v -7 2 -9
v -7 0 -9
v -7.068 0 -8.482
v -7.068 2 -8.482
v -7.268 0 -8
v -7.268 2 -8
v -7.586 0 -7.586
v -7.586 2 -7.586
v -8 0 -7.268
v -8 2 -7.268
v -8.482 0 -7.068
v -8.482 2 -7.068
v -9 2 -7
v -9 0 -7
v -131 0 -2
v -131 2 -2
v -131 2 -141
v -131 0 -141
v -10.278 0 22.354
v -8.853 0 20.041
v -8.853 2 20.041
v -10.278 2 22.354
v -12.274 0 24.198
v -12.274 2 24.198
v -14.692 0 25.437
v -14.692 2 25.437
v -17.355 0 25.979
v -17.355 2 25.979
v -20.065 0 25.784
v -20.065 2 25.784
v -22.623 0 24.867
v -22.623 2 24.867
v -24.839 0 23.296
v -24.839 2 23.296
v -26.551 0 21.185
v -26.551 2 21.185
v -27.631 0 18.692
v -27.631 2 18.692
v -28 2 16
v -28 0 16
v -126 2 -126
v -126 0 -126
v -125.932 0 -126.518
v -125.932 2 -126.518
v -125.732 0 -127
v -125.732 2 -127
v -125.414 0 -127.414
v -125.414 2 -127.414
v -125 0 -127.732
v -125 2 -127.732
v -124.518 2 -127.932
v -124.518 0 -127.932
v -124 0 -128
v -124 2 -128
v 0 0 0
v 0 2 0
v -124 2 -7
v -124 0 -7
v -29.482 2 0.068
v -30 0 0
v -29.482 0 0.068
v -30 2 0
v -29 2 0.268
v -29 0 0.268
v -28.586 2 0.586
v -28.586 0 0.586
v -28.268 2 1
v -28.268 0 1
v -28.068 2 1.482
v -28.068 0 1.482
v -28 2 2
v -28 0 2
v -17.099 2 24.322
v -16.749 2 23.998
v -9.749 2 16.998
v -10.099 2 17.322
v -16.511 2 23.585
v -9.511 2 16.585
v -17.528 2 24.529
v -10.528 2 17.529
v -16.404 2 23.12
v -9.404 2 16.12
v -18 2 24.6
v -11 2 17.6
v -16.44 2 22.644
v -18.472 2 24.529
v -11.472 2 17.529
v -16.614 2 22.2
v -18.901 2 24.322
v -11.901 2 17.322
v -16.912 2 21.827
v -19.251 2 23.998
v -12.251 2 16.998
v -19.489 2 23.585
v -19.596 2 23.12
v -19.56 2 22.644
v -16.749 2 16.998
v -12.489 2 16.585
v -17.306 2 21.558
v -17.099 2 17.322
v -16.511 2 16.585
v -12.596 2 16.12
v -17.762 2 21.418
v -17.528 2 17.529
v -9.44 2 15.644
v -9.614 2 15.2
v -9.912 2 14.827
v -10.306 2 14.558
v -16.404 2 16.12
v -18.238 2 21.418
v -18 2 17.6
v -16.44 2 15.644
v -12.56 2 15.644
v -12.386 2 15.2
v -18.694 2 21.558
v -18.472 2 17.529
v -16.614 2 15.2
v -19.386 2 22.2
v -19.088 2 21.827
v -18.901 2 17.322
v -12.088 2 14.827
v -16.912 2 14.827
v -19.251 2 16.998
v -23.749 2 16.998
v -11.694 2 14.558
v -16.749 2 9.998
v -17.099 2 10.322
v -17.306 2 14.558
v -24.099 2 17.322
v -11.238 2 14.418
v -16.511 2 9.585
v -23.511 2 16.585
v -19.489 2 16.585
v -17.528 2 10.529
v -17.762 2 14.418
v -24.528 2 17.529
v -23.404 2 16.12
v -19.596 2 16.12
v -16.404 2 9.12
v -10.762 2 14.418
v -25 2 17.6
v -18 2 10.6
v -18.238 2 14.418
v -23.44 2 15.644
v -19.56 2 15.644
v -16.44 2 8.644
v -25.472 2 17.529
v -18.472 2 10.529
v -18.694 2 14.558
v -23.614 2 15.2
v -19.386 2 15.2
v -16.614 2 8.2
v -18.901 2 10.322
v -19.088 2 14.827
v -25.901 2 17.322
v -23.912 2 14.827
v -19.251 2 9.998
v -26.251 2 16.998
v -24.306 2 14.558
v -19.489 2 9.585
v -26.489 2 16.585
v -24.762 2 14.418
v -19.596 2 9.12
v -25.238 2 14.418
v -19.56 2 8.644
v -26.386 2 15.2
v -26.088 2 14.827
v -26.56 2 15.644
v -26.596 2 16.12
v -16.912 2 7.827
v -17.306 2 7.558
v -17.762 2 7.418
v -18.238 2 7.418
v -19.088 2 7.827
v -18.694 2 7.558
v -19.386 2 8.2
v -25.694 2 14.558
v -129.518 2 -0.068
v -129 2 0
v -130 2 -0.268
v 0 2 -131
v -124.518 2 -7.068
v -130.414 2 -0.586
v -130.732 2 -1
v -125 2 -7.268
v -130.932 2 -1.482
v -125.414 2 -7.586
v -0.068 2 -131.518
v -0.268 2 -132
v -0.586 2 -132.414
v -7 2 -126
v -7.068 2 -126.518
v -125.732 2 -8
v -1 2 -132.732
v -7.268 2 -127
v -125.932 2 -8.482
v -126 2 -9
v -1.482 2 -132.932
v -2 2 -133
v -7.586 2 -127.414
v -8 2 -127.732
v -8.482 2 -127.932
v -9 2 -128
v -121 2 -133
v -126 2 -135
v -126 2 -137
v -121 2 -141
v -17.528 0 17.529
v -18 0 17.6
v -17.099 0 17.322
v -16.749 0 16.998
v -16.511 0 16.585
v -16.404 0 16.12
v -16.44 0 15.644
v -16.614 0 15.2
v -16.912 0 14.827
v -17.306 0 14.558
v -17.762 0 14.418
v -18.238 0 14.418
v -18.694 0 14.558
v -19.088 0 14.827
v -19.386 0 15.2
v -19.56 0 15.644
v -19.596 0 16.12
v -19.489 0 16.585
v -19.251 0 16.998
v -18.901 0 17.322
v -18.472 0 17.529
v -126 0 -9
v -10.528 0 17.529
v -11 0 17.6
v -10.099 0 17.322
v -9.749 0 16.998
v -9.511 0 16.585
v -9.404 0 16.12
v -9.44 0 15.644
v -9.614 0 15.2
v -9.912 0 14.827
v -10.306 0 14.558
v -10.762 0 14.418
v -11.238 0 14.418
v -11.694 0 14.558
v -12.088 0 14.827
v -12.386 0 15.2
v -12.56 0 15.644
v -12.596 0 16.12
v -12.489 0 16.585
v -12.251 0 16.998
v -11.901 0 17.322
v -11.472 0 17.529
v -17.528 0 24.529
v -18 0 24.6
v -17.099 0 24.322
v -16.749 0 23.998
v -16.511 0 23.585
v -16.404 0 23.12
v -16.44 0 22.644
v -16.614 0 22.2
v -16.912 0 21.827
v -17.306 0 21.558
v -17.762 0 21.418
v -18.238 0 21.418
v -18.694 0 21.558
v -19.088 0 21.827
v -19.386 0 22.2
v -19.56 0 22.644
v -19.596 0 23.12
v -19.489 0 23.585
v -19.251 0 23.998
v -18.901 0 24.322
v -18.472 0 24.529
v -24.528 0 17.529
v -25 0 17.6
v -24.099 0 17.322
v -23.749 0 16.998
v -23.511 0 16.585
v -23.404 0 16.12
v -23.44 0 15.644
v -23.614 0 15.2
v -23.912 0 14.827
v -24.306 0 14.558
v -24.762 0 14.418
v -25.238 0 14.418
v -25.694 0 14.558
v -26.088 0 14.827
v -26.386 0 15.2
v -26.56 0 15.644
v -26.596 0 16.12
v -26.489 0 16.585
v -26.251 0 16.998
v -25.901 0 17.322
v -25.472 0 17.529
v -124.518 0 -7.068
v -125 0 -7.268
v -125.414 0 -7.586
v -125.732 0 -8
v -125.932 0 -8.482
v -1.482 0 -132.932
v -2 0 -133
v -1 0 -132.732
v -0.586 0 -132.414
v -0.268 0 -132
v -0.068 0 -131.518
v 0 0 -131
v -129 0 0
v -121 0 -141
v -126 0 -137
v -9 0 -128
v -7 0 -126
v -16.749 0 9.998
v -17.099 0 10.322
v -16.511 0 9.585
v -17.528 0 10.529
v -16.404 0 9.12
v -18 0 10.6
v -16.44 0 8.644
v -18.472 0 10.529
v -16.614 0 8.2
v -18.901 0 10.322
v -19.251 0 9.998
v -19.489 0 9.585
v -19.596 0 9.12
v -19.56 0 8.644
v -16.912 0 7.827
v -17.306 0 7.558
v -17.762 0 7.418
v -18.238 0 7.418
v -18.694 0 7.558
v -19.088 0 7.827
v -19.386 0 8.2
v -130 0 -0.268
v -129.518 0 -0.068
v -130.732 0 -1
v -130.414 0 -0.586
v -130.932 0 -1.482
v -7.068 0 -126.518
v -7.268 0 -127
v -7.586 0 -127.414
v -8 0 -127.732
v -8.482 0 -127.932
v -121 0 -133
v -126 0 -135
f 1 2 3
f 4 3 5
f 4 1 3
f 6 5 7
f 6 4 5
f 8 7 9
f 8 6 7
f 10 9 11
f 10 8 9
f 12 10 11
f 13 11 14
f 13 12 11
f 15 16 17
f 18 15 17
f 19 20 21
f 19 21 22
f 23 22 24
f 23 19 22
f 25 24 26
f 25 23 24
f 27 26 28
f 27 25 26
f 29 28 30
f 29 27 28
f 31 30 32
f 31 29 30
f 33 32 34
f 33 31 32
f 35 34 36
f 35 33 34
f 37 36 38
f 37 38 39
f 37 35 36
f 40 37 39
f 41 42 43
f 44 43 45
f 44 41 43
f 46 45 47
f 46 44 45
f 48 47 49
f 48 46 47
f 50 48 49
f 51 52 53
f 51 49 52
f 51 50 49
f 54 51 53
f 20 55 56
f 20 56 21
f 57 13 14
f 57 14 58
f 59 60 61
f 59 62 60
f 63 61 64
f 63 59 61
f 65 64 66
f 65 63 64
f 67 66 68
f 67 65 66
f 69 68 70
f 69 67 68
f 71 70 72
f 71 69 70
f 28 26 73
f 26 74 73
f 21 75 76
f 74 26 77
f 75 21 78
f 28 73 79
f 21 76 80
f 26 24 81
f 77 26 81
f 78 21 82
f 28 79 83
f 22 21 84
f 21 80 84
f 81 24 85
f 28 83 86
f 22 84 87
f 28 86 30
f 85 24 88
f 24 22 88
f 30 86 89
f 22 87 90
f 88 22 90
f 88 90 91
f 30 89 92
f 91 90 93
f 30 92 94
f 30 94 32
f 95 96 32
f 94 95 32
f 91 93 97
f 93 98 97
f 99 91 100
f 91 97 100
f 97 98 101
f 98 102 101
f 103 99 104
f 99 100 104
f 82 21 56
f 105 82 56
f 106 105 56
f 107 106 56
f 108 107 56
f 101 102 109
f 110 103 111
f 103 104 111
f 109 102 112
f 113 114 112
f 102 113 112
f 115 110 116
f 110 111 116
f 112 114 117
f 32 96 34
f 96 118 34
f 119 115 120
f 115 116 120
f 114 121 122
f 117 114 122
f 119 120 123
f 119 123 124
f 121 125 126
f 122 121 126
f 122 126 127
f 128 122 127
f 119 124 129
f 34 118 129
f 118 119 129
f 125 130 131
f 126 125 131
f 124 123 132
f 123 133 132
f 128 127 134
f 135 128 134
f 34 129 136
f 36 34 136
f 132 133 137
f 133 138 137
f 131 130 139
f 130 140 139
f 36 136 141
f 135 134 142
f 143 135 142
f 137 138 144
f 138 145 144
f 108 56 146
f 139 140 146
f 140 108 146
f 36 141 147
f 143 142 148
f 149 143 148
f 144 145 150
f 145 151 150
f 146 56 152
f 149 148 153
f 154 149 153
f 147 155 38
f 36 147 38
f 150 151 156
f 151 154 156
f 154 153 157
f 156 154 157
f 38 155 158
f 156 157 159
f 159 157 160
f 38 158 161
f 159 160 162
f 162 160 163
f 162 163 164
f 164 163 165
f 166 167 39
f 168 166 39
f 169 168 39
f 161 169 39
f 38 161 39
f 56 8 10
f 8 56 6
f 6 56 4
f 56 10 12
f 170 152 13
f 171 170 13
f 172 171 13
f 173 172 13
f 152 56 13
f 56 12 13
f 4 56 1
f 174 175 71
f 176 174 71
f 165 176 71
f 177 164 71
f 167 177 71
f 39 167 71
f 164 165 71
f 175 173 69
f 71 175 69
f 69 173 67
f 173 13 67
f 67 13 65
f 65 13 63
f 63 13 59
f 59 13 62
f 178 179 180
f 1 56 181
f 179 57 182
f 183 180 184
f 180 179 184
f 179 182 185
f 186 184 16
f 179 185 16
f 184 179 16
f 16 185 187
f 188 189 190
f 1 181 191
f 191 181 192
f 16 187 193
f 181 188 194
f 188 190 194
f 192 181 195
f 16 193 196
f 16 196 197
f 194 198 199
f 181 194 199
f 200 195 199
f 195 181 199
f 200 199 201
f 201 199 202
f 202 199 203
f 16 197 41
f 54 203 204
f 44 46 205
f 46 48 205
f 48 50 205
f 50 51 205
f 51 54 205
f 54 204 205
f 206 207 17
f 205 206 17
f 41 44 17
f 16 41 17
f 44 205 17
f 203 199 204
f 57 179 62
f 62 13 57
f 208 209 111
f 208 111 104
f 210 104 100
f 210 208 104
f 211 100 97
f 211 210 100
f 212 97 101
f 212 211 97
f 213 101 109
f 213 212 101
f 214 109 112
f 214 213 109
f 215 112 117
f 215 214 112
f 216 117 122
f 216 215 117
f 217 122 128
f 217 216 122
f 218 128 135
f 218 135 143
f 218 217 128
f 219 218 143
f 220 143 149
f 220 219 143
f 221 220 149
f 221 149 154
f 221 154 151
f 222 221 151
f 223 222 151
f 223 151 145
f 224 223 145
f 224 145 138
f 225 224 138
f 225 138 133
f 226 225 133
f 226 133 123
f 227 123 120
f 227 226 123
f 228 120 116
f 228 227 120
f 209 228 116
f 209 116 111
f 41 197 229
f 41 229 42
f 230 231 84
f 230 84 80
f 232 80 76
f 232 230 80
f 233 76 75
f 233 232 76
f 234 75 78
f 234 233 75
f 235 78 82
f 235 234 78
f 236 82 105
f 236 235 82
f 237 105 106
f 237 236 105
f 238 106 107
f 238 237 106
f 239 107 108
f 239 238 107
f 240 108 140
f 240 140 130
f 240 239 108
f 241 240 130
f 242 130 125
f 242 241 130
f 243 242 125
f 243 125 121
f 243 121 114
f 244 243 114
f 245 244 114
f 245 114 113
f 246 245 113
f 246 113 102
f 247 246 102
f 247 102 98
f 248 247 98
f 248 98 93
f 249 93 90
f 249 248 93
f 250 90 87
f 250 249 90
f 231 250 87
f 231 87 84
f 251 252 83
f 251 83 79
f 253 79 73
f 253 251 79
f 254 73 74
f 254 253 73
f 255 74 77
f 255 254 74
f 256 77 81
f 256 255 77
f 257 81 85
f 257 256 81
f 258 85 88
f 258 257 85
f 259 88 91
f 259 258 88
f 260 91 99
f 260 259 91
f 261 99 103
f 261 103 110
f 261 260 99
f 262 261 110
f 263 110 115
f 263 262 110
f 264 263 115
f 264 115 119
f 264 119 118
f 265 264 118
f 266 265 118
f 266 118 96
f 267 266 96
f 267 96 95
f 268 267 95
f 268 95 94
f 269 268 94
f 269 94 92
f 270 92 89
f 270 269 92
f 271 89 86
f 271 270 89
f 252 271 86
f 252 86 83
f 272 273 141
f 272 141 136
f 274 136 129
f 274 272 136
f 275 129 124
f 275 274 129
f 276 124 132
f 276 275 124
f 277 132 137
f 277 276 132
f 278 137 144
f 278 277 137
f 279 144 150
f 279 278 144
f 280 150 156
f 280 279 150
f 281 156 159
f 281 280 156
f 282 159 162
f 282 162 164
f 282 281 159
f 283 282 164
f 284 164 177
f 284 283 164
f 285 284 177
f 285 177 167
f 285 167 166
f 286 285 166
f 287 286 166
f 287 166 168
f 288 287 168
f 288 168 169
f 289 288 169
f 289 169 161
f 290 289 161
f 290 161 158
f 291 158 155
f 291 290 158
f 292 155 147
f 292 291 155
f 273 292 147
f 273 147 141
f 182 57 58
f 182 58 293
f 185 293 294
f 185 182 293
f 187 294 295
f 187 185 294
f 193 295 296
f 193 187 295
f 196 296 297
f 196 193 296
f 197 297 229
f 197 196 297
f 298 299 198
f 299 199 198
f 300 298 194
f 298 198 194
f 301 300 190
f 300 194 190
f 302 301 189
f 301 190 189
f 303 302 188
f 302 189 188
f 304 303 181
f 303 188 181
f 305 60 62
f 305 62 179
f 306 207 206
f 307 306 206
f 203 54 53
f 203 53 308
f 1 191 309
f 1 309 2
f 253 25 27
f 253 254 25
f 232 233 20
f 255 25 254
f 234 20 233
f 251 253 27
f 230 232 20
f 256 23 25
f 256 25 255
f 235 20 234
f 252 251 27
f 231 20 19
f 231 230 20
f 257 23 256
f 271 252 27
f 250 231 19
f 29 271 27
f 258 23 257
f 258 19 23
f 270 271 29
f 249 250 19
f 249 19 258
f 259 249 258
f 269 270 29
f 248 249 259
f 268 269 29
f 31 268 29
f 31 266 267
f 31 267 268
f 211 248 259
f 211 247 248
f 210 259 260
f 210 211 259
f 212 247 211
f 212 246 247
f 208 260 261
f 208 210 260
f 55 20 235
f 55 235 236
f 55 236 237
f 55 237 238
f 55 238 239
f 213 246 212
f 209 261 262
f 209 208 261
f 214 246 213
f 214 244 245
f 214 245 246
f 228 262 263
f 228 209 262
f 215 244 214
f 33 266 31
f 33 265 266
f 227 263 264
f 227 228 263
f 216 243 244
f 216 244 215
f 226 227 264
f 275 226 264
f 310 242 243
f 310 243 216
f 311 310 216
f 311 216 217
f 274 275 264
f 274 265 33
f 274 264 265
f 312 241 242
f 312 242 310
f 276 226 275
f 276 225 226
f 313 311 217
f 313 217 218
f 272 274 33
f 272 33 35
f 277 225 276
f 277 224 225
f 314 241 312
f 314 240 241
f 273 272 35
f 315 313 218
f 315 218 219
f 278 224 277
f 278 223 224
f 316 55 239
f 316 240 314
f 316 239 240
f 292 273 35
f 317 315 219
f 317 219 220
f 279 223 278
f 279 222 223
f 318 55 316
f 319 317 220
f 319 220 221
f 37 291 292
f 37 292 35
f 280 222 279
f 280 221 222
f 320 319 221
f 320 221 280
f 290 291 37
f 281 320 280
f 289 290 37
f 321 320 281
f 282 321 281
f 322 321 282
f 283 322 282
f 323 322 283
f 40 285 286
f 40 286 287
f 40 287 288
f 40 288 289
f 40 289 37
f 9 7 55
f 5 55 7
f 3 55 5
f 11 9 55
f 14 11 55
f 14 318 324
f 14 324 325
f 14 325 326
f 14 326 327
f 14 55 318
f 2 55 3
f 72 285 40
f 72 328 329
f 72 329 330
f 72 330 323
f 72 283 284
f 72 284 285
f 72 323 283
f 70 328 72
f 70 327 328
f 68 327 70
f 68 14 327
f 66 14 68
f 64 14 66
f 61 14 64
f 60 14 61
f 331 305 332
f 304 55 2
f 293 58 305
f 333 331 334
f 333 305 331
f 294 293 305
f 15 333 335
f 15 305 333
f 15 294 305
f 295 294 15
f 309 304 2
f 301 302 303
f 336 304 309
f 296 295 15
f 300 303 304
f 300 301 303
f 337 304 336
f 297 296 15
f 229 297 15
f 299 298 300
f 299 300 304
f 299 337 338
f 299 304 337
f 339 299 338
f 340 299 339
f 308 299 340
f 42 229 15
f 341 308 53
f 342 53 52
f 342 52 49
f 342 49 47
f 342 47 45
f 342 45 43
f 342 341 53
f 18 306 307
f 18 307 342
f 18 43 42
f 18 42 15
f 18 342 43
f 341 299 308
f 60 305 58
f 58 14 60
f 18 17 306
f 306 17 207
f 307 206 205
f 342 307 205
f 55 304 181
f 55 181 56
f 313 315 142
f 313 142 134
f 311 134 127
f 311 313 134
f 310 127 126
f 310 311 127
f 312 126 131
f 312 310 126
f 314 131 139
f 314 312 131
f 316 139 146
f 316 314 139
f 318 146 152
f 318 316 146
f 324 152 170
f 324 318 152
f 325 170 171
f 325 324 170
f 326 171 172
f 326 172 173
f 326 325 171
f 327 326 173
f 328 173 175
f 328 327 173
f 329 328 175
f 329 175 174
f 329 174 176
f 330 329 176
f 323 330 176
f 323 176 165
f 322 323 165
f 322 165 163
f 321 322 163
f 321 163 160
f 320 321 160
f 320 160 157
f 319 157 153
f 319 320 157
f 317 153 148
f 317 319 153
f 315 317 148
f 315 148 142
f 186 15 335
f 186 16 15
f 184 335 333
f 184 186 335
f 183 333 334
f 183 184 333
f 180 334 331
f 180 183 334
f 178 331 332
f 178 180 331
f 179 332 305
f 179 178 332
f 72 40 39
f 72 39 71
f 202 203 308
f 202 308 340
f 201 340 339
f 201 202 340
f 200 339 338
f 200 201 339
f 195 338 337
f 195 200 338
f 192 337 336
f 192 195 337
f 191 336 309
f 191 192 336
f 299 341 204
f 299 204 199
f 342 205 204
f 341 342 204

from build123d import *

# Parameters (mm, degrees)
SKETCH_1_R          = 1.6
EXTRUDE_1_DEPTH     = 2
EXTRUDE_2_DEPTH     = 2
CUT_EXTRUDE_1_DEPTH = 193.473374782
FILLET_1_R          = 2


with BuildPart() as part:
    # 草图1 → 凸台-拉伸1 (new body)
    with BuildSketch(Plane(origin=(0, 0, 0), x_dir=(1, 0, 0), z_dir=(0, 1, 0))):
        with BuildLine():
            Line((-28, -16), (-28, 0))
            Line((-28, 0), (-131, 0))
            Line((-131, 0), (-131, 133))
            Line((-131, 133), (0, 133))
            Line((0, 133), (0, 0))
            Line((0, 0), (-8.852716607, -20.040693817))
            ThreePointArc((-8.852716607, -20.040693817), (-20.064844554, -25.78449881), (-28, -16))
        make_face()
        with Locations(Location((-18, -9, 0), (0, 0, 270))):
            Circle(SKETCH_1_R, mode=Mode.SUBTRACT)
        with Locations(Location((-11, -16, 0), (0, 0, 270))):
            Circle(SKETCH_1_R, mode=Mode.SUBTRACT)
        with Locations(Location((-18, -23, 0), (0, 0, 270))):
            Circle(SKETCH_1_R, mode=Mode.SUBTRACT)
        with Locations(Location((-25, -16, 0), (0, 0, 270))):
            Circle(SKETCH_1_R, mode=Mode.SUBTRACT)
        with Locations(Location((-18, -16, 0), (0, 0, 270))):
            Circle(SKETCH_1_R, mode=Mode.SUBTRACT)
    extrude(amount=EXTRUDE_1_DEPTH)

    # 草图2 → 凸台-拉伸2 (add)
    with BuildSketch(Plane(origin=(0, 2, 0), x_dir=(1, 0, 0), z_dir=(0, 1, 0))):
        Polygon((-131, 133), (-131, 141), (-121, 141), (-126, 137), (-126, 135), (-121, 133), align=None)
    extrude(amount=-EXTRUDE_2_DEPTH)

    # 草图3 → 切除-拉伸1 (cut, through all)
    with BuildSketch(Plane(origin=(0, 2, 0), x_dir=(1, 0, 0), z_dir=(0, 1, 0))):
        with BuildLine():
            Line((-124, 128), (-9, 128))
            ThreePointArc((-9, 128), (-7.585786438, 127.414213562), (-7, 126))
            Line((-7, 126), (-7, 9))
            ThreePointArc((-7, 9), (-7.585786438, 7.585786438), (-9, 7))
            Line((-9, 7), (-124, 7))
            ThreePointArc((-124, 7), (-125.414213562, 7.585786438), (-126, 9))
            Line((-126, 9), (-126, 126))
            ThreePointArc((-126, 126), (-125.414213562, 127.414213562), (-124, 128))
        make_face()
    extrude(amount=-CUT_EXTRUDE_1_DEPTH, mode=Mode.SUBTRACT)

    # 圆角1
    fillet_1_edges = [part.edges().sort_by_distance(p)[0] for p in [
        (-28, 1, 0),
        (-131, 1, 0),
        (0, 1, -133),
    ]]
    fillet(fillet_1_edges, radius=FILLET_1_R)


solid = part.part
